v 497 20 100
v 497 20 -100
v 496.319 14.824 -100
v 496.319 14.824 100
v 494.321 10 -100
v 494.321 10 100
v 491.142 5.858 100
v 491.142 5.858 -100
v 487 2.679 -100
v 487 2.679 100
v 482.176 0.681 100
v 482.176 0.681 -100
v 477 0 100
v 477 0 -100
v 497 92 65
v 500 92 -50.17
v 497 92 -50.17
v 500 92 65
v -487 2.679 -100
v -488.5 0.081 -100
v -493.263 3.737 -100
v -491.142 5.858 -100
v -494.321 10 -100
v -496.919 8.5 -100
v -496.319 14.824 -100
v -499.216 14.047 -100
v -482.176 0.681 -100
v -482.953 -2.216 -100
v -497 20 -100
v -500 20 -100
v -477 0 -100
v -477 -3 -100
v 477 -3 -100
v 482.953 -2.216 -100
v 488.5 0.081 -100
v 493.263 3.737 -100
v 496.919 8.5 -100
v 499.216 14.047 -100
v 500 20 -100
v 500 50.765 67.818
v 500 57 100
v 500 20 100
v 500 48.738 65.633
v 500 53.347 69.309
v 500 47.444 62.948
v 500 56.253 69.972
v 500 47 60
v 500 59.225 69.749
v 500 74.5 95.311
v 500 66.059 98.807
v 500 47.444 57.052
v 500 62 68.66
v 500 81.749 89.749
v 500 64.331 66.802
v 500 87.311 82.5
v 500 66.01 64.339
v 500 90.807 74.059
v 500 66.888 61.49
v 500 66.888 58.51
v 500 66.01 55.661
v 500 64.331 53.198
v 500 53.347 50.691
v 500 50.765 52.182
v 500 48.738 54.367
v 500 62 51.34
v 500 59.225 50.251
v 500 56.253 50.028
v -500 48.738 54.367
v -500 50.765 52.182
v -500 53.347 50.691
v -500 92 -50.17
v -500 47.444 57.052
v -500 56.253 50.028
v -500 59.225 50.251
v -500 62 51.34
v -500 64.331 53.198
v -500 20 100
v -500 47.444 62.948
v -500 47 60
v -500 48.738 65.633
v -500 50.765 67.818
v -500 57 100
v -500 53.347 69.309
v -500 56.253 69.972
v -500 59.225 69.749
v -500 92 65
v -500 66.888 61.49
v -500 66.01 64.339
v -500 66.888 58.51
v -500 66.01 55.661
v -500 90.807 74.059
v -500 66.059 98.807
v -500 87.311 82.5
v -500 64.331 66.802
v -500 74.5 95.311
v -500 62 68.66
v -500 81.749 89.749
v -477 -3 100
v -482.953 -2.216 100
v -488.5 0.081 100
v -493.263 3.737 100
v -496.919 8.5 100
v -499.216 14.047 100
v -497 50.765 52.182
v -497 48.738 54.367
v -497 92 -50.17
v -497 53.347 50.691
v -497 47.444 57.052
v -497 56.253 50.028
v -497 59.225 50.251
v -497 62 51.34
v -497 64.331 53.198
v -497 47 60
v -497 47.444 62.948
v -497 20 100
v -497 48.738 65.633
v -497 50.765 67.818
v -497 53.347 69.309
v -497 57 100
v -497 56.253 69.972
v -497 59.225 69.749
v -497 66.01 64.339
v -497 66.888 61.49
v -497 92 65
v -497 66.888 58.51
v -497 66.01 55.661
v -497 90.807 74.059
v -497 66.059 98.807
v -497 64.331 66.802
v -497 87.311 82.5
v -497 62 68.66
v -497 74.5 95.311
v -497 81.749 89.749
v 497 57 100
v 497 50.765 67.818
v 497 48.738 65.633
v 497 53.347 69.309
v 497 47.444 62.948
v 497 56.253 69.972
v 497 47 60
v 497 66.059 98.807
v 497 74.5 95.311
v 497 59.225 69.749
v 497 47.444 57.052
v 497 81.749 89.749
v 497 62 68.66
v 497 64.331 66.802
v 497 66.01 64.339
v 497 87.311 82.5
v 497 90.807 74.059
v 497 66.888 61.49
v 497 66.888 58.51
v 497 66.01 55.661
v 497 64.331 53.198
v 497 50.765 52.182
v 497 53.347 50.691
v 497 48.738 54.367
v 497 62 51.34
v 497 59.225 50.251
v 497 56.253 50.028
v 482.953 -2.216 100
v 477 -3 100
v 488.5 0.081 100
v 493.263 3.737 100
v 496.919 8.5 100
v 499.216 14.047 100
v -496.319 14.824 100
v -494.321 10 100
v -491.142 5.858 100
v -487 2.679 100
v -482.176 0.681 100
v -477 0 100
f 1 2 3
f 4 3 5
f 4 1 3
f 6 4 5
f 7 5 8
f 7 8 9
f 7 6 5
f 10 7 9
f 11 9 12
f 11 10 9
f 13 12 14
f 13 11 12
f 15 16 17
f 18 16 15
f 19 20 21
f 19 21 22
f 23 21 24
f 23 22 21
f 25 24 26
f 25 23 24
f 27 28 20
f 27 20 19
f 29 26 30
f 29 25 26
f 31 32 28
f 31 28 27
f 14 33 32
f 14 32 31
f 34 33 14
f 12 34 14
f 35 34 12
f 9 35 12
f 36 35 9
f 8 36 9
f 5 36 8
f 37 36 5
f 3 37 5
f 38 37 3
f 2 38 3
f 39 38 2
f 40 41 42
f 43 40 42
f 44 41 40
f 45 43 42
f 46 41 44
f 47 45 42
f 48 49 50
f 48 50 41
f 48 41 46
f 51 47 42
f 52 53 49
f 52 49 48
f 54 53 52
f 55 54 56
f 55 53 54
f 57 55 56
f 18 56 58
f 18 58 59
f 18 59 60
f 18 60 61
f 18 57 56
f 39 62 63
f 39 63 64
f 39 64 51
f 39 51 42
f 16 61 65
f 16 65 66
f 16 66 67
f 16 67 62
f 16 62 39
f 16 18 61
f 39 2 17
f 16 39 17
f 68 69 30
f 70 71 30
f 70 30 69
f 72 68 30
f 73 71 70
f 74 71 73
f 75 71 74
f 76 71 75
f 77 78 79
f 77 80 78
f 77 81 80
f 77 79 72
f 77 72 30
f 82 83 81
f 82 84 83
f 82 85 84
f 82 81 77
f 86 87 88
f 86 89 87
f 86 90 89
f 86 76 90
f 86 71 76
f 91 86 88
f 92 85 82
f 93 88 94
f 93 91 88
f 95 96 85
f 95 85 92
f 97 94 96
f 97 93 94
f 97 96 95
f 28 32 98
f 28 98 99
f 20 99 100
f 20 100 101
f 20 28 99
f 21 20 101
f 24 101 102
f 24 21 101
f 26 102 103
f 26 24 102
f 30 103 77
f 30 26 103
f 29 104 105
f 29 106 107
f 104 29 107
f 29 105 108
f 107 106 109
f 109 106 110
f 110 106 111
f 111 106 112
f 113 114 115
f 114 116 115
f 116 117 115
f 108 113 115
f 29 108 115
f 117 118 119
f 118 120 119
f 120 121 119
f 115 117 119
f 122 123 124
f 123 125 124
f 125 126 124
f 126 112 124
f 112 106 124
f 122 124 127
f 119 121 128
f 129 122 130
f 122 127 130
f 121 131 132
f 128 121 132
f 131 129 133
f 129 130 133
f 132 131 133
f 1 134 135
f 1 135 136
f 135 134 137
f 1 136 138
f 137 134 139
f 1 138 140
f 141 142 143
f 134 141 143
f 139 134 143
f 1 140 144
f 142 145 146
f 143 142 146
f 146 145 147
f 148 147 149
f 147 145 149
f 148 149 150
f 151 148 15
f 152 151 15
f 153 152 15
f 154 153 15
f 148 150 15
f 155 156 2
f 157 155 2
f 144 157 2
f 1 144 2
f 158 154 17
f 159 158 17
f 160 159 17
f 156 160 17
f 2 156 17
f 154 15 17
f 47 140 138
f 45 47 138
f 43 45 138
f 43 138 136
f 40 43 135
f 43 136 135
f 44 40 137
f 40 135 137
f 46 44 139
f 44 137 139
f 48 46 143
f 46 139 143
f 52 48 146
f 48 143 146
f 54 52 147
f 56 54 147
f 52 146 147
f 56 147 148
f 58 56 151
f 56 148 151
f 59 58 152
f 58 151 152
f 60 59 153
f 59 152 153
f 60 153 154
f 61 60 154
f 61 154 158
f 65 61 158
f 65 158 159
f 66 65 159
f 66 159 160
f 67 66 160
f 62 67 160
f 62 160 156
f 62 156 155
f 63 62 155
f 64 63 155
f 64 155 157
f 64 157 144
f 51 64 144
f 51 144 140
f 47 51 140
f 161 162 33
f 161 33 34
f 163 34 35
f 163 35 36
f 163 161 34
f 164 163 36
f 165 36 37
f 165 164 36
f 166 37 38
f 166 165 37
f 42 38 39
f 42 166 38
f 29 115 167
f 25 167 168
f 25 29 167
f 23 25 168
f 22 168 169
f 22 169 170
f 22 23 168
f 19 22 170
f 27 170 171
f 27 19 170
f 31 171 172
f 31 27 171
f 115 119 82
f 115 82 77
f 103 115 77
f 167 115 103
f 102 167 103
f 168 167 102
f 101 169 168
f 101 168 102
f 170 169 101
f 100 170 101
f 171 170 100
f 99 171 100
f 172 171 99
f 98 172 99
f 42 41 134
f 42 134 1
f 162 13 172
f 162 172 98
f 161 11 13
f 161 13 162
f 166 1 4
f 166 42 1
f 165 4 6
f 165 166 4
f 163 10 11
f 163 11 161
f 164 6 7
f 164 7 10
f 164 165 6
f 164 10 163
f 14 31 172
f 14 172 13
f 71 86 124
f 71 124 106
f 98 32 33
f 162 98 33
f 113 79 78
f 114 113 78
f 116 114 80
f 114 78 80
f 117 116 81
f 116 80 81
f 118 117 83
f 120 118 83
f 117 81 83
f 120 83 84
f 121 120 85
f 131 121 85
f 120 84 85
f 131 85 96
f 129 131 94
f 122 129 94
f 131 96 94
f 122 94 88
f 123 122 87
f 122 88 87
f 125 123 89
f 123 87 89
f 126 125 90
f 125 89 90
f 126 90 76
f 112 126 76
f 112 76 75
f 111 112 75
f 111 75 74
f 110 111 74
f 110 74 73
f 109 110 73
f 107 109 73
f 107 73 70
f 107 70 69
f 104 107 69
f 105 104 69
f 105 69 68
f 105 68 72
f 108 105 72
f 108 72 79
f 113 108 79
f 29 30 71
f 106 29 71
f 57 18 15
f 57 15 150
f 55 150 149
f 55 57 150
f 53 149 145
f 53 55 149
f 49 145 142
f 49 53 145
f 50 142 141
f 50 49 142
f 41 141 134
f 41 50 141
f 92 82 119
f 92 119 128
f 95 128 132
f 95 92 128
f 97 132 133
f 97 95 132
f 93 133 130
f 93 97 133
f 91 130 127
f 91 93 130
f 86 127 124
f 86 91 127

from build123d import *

# Parameters (mm, degrees)
SKETCH1_W                    = 1000
SKETCH1_H                    = 200
BASE_FLANGE1_DEPTH           = 3
EDGE_FLANGE1_STRIP_W         = 52
EDGE_FLANGE1_STRIP_H         = 3
EDGE_FLANGE1_STRIP_CUT_DEPTH = 200
EDGE_FLANGE1_DEPTH           = 200
EDGE_FLANGE1_FLAT_DEPTH      = 3
EDGE_FLANGE2_STRIP_W         = 52
EDGE_FLANGE2_STRIP_H         = 3
EDGE_FLANGE2_STRIP_CUT_DEPTH = 200
EDGE_FLANGE2_DEPTH           = 200
EDGE_FLANGE2_FLAT_DEPTH      = 3
SKETCH13_R                   = 10
CUT_EXTRUDE1_DEPTH           = 1010.189774027


# Sheet-metal steps are written as plain solids
with BuildPart() as part:
    # Sketch1 → Base-Flange1 (new body)
    with BuildSketch(Plane(origin=(0, 0, 0), x_dir=(1, 0, 0), z_dir=(0, 1, 0))):
        Rectangle(SKETCH1_W, SKETCH1_H)
    extrude(amount=-BASE_FLANGE1_DEPTH)

    # Edge-Flange1 strip (across the edge) → Edge-Flange1 strip cut (cut)
    with BuildSketch(Plane(origin=(-500, 0, -100), x_dir=(1, 0, 0), z_dir=(0, 0, 1))):
        with Locations((-3, -1.5)):
            Rectangle(EDGE_FLANGE1_STRIP_W, EDGE_FLANGE1_STRIP_H)
    extrude(amount=EDGE_FLANGE1_STRIP_CUT_DEPTH, mode=Mode.SUBTRACT)

    # Edge-Flange1 bend section (across the edge) → Edge-Flange1 (add)
    with BuildSketch(Plane(origin=(-500, 0, -100), x_dir=(1, 0, 0), z_dir=(0, 0, 1))):
        with BuildLine():
            Line((0, 20), (3, 20))
            ThreePointArc((3, 20), (8.857864376, 5.857864376), (23, 0))
            Line((23, 0), (23, -3))
            ThreePointArc((23, -3), (6.736544033, 3.736544033), (0, 20))
        make_face()
    extrude(amount=EDGE_FLANGE1_DEPTH)

    # Edge-Flange1 profile (on flange) → Edge-Flange1 flat (add)
    with BuildSketch(Plane.ZY.offset(500)):
        with BuildLine():
            Line((-100, 92), (-100, 20))
            Line((-100, 20), (100, 20))
            Line((100, 20), (100, 57))
            ThreePointArc((100, 57), (89.748737342, 81.748737342), (65, 92))
            Line((65, 92), (-100, 92))
        make_face()
    extrude(amount=-EDGE_FLANGE1_FLAT_DEPTH)

    # Edge-Flange2 strip (across the edge) → Edge-Flange2 strip cut (cut)
    with BuildSketch(Plane(origin=(500, 0, 100), x_dir=(-1, 0, 0), z_dir=(0, 0, -1))):
        with Locations((-3, -1.5)):
            Rectangle(EDGE_FLANGE2_STRIP_W, EDGE_FLANGE2_STRIP_H)
    extrude(amount=EDGE_FLANGE2_STRIP_CUT_DEPTH, mode=Mode.SUBTRACT)

    # Edge-Flange2 bend section (across the edge) → Edge-Flange2 (add)
    with BuildSketch(Plane(origin=(500, 0, 100), x_dir=(-1, 0, 0), z_dir=(0, 0, -1))):
        with BuildLine():
            Line((0, 20), (3, 20))
            ThreePointArc((3, 20), (8.857864376, 5.857864376), (23, 0))
            Line((23, 0), (23, -3))
            ThreePointArc((23, -3), (6.736544033, 3.736544033), (0, 20))
        make_face()
    extrude(amount=EDGE_FLANGE2_DEPTH)

    # Edge-Flange2 profile (on flange) → Edge-Flange2 flat (add)
    with BuildSketch(Plane(origin=(500, 0, 0), x_dir=(0, 0, -1), z_dir=(1, 0, 0))):
        with BuildLine():
            Line((100, 92), (-65, 92))
            ThreePointArc((-65, 92), (-89.748737342, 81.748737342), (-100, 57))
            Line((-100, 57), (-100, 20))
            Line((-100, 20), (100, 20))
            Line((100, 20), (100, 92))
        make_face()
    extrude(amount=-EDGE_FLANGE2_FLAT_DEPTH)

    # Sketch13 → Cut-Extrude1 (cut, through all)
    with BuildSketch(Plane.ZY.offset(500)):
        with Locations(Location((60, 57, 0), (0, 0, 270))):
            Circle(SKETCH13_R)
        Polygon((-100, 20), (-50, 92.245135124), (-100, 92), align=None)
    extrude(amount=-CUT_EXTRUDE1_DEPTH, mode=Mode.SUBTRACT)


solid = part.part
